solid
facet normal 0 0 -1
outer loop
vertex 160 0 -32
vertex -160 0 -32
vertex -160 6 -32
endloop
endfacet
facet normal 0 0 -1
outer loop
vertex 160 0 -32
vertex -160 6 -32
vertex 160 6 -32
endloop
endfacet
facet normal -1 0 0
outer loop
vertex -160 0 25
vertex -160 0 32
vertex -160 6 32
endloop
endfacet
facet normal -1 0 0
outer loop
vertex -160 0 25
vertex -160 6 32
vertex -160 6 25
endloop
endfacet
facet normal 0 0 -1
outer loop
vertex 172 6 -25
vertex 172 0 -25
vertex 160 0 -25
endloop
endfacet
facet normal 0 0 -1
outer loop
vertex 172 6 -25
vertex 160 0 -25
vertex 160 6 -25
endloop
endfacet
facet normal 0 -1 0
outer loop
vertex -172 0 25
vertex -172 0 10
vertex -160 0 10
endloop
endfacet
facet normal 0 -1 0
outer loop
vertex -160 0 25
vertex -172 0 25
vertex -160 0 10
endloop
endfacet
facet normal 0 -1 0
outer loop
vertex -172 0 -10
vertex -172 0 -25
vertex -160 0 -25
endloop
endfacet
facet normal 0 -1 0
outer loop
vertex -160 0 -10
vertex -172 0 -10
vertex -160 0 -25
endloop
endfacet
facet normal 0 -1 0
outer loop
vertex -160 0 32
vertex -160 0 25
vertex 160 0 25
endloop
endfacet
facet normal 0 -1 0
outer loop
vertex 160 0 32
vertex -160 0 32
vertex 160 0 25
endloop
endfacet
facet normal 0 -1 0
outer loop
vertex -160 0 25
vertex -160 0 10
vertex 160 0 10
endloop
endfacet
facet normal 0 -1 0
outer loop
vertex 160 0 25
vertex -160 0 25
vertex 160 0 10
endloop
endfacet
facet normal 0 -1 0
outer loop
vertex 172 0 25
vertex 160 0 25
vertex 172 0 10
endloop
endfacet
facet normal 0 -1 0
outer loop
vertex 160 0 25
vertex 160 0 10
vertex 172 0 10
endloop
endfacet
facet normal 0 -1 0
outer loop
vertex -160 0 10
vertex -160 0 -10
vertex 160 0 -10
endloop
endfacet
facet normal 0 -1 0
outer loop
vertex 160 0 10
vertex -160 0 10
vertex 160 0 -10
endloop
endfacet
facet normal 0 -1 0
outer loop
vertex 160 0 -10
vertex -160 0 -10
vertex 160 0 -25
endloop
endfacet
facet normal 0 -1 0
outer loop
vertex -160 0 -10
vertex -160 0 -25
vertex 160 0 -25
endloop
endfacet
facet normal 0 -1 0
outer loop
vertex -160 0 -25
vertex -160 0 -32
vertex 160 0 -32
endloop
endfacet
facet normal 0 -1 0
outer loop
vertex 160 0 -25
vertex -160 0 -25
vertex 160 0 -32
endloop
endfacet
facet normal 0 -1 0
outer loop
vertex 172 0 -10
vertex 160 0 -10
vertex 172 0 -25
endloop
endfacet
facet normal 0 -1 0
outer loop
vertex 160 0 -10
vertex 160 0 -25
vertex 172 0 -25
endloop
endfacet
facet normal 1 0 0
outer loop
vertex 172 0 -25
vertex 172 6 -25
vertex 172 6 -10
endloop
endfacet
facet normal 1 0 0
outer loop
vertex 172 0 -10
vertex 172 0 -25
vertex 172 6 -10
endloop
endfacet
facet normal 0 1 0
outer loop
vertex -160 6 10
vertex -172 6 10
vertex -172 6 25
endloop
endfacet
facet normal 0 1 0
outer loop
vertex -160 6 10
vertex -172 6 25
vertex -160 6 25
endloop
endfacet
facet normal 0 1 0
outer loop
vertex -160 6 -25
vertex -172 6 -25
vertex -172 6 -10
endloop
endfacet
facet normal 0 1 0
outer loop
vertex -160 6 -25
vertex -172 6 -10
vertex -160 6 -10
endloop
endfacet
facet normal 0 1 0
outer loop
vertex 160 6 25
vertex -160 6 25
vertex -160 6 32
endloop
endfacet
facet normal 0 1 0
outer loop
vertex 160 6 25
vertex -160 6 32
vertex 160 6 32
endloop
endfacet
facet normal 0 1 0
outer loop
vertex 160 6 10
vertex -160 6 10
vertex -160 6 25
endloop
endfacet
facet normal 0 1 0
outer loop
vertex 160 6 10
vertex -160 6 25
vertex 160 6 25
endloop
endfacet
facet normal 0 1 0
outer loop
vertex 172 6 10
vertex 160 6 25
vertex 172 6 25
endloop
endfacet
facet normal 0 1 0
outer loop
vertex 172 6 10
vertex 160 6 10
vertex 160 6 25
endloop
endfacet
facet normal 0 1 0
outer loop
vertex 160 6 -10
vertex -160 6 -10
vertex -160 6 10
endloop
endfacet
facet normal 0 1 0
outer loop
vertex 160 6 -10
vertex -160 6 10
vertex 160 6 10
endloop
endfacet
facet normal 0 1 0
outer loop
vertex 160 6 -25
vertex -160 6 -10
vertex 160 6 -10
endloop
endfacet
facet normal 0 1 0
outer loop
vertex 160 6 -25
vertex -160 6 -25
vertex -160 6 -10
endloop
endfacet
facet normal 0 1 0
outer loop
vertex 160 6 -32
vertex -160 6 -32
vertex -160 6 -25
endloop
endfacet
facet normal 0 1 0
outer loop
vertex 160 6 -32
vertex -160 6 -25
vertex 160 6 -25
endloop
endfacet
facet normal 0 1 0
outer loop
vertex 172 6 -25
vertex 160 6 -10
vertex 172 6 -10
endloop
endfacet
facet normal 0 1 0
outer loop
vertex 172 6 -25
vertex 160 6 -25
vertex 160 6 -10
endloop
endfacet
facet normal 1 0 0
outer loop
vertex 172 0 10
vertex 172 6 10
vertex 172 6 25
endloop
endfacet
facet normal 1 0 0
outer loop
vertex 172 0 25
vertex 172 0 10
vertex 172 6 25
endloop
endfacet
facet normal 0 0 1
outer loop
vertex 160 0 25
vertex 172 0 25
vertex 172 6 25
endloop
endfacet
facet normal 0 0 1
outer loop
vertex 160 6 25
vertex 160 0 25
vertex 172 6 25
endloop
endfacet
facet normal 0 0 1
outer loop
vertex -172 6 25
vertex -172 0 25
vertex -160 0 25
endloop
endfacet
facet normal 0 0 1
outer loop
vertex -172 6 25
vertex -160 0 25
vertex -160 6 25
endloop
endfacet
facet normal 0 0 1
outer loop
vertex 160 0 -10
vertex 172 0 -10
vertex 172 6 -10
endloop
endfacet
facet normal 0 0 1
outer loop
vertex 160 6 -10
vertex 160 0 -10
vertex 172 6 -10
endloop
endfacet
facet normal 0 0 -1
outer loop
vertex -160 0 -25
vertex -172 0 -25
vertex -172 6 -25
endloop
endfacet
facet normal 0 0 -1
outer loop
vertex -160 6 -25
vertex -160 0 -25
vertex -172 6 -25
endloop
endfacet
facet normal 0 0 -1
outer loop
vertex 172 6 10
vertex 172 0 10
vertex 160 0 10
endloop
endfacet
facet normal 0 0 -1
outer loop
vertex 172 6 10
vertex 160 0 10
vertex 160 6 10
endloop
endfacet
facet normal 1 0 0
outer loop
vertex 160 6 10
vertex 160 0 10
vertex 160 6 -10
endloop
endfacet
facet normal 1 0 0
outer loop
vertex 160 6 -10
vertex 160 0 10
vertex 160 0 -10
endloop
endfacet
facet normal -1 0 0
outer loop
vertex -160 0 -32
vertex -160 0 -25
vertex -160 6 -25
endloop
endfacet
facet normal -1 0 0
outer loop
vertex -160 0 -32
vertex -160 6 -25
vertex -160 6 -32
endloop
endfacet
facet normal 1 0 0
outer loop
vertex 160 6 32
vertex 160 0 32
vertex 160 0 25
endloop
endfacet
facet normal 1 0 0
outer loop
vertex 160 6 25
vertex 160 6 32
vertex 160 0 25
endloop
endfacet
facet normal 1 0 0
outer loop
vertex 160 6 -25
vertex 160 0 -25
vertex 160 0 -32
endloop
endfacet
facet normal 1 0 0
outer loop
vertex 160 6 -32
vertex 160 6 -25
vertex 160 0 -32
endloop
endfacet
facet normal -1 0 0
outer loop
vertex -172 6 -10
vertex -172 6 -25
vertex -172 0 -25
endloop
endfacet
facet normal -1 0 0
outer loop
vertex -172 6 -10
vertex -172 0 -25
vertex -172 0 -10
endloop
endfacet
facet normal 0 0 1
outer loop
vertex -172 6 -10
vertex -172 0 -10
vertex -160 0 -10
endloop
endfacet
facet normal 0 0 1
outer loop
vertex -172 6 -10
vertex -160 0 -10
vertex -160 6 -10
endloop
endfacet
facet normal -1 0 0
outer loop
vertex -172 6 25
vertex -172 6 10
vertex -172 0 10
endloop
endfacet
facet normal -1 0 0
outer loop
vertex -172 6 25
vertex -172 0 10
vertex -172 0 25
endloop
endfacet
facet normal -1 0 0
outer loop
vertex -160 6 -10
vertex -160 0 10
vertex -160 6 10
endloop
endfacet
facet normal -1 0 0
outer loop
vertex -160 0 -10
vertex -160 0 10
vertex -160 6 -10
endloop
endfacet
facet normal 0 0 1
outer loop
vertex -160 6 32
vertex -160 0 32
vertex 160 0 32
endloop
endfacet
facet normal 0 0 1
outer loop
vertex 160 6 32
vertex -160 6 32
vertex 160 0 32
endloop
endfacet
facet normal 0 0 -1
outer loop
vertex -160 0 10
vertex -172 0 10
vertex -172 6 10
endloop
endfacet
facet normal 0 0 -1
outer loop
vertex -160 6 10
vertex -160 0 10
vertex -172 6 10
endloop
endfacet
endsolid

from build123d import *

# Parameters (mm, degrees)
SKIZZE1_W                       = 320
SKIZZE1_H                       = 64
GRUNDFORM_DEPTH                 = 6
SKIZZE3_W                       = 15
SKIZZE3_H                       = 6
AUFSATZ_LINEAR_AUSTRAGEN2_DEPTH = 12


with BuildPart() as part:
    # Skizze1 → Grundform (new body)
    with BuildSketch(Plane(origin=(0, 0, 0), x_dir=(1, 0, 0), z_dir=(0, 1, 0))):
        Rectangle(SKIZZE1_W, SKIZZE1_H)
    extrude(amount=GRUNDFORM_DEPTH)

    # Skizze3 → Aufsatz-Linear austragen2 (add)
    with BuildSketch(Plane.ZY.offset(160)):
        with Locations((-17.5, 3)):
            Rectangle(SKIZZE3_W, SKIZZE3_H)
        with Locations((17.5, 3)):
            Rectangle(SKIZZE3_W, SKIZZE3_H)
    aufsatz_linear_austragen2 = extrude(amount=AUFSATZ_LINEAR_AUSTRAGEN2_DEPTH)

    # Spiegeln1: Aufsatz-Linear austragen2 across plane
    add(aufsatz_linear_austragen2.mirror(Plane(origin=(0, 0, 0), x_dir=(0, 0, 1), z_dir=(1, 0, 0))))


solid = part.part
